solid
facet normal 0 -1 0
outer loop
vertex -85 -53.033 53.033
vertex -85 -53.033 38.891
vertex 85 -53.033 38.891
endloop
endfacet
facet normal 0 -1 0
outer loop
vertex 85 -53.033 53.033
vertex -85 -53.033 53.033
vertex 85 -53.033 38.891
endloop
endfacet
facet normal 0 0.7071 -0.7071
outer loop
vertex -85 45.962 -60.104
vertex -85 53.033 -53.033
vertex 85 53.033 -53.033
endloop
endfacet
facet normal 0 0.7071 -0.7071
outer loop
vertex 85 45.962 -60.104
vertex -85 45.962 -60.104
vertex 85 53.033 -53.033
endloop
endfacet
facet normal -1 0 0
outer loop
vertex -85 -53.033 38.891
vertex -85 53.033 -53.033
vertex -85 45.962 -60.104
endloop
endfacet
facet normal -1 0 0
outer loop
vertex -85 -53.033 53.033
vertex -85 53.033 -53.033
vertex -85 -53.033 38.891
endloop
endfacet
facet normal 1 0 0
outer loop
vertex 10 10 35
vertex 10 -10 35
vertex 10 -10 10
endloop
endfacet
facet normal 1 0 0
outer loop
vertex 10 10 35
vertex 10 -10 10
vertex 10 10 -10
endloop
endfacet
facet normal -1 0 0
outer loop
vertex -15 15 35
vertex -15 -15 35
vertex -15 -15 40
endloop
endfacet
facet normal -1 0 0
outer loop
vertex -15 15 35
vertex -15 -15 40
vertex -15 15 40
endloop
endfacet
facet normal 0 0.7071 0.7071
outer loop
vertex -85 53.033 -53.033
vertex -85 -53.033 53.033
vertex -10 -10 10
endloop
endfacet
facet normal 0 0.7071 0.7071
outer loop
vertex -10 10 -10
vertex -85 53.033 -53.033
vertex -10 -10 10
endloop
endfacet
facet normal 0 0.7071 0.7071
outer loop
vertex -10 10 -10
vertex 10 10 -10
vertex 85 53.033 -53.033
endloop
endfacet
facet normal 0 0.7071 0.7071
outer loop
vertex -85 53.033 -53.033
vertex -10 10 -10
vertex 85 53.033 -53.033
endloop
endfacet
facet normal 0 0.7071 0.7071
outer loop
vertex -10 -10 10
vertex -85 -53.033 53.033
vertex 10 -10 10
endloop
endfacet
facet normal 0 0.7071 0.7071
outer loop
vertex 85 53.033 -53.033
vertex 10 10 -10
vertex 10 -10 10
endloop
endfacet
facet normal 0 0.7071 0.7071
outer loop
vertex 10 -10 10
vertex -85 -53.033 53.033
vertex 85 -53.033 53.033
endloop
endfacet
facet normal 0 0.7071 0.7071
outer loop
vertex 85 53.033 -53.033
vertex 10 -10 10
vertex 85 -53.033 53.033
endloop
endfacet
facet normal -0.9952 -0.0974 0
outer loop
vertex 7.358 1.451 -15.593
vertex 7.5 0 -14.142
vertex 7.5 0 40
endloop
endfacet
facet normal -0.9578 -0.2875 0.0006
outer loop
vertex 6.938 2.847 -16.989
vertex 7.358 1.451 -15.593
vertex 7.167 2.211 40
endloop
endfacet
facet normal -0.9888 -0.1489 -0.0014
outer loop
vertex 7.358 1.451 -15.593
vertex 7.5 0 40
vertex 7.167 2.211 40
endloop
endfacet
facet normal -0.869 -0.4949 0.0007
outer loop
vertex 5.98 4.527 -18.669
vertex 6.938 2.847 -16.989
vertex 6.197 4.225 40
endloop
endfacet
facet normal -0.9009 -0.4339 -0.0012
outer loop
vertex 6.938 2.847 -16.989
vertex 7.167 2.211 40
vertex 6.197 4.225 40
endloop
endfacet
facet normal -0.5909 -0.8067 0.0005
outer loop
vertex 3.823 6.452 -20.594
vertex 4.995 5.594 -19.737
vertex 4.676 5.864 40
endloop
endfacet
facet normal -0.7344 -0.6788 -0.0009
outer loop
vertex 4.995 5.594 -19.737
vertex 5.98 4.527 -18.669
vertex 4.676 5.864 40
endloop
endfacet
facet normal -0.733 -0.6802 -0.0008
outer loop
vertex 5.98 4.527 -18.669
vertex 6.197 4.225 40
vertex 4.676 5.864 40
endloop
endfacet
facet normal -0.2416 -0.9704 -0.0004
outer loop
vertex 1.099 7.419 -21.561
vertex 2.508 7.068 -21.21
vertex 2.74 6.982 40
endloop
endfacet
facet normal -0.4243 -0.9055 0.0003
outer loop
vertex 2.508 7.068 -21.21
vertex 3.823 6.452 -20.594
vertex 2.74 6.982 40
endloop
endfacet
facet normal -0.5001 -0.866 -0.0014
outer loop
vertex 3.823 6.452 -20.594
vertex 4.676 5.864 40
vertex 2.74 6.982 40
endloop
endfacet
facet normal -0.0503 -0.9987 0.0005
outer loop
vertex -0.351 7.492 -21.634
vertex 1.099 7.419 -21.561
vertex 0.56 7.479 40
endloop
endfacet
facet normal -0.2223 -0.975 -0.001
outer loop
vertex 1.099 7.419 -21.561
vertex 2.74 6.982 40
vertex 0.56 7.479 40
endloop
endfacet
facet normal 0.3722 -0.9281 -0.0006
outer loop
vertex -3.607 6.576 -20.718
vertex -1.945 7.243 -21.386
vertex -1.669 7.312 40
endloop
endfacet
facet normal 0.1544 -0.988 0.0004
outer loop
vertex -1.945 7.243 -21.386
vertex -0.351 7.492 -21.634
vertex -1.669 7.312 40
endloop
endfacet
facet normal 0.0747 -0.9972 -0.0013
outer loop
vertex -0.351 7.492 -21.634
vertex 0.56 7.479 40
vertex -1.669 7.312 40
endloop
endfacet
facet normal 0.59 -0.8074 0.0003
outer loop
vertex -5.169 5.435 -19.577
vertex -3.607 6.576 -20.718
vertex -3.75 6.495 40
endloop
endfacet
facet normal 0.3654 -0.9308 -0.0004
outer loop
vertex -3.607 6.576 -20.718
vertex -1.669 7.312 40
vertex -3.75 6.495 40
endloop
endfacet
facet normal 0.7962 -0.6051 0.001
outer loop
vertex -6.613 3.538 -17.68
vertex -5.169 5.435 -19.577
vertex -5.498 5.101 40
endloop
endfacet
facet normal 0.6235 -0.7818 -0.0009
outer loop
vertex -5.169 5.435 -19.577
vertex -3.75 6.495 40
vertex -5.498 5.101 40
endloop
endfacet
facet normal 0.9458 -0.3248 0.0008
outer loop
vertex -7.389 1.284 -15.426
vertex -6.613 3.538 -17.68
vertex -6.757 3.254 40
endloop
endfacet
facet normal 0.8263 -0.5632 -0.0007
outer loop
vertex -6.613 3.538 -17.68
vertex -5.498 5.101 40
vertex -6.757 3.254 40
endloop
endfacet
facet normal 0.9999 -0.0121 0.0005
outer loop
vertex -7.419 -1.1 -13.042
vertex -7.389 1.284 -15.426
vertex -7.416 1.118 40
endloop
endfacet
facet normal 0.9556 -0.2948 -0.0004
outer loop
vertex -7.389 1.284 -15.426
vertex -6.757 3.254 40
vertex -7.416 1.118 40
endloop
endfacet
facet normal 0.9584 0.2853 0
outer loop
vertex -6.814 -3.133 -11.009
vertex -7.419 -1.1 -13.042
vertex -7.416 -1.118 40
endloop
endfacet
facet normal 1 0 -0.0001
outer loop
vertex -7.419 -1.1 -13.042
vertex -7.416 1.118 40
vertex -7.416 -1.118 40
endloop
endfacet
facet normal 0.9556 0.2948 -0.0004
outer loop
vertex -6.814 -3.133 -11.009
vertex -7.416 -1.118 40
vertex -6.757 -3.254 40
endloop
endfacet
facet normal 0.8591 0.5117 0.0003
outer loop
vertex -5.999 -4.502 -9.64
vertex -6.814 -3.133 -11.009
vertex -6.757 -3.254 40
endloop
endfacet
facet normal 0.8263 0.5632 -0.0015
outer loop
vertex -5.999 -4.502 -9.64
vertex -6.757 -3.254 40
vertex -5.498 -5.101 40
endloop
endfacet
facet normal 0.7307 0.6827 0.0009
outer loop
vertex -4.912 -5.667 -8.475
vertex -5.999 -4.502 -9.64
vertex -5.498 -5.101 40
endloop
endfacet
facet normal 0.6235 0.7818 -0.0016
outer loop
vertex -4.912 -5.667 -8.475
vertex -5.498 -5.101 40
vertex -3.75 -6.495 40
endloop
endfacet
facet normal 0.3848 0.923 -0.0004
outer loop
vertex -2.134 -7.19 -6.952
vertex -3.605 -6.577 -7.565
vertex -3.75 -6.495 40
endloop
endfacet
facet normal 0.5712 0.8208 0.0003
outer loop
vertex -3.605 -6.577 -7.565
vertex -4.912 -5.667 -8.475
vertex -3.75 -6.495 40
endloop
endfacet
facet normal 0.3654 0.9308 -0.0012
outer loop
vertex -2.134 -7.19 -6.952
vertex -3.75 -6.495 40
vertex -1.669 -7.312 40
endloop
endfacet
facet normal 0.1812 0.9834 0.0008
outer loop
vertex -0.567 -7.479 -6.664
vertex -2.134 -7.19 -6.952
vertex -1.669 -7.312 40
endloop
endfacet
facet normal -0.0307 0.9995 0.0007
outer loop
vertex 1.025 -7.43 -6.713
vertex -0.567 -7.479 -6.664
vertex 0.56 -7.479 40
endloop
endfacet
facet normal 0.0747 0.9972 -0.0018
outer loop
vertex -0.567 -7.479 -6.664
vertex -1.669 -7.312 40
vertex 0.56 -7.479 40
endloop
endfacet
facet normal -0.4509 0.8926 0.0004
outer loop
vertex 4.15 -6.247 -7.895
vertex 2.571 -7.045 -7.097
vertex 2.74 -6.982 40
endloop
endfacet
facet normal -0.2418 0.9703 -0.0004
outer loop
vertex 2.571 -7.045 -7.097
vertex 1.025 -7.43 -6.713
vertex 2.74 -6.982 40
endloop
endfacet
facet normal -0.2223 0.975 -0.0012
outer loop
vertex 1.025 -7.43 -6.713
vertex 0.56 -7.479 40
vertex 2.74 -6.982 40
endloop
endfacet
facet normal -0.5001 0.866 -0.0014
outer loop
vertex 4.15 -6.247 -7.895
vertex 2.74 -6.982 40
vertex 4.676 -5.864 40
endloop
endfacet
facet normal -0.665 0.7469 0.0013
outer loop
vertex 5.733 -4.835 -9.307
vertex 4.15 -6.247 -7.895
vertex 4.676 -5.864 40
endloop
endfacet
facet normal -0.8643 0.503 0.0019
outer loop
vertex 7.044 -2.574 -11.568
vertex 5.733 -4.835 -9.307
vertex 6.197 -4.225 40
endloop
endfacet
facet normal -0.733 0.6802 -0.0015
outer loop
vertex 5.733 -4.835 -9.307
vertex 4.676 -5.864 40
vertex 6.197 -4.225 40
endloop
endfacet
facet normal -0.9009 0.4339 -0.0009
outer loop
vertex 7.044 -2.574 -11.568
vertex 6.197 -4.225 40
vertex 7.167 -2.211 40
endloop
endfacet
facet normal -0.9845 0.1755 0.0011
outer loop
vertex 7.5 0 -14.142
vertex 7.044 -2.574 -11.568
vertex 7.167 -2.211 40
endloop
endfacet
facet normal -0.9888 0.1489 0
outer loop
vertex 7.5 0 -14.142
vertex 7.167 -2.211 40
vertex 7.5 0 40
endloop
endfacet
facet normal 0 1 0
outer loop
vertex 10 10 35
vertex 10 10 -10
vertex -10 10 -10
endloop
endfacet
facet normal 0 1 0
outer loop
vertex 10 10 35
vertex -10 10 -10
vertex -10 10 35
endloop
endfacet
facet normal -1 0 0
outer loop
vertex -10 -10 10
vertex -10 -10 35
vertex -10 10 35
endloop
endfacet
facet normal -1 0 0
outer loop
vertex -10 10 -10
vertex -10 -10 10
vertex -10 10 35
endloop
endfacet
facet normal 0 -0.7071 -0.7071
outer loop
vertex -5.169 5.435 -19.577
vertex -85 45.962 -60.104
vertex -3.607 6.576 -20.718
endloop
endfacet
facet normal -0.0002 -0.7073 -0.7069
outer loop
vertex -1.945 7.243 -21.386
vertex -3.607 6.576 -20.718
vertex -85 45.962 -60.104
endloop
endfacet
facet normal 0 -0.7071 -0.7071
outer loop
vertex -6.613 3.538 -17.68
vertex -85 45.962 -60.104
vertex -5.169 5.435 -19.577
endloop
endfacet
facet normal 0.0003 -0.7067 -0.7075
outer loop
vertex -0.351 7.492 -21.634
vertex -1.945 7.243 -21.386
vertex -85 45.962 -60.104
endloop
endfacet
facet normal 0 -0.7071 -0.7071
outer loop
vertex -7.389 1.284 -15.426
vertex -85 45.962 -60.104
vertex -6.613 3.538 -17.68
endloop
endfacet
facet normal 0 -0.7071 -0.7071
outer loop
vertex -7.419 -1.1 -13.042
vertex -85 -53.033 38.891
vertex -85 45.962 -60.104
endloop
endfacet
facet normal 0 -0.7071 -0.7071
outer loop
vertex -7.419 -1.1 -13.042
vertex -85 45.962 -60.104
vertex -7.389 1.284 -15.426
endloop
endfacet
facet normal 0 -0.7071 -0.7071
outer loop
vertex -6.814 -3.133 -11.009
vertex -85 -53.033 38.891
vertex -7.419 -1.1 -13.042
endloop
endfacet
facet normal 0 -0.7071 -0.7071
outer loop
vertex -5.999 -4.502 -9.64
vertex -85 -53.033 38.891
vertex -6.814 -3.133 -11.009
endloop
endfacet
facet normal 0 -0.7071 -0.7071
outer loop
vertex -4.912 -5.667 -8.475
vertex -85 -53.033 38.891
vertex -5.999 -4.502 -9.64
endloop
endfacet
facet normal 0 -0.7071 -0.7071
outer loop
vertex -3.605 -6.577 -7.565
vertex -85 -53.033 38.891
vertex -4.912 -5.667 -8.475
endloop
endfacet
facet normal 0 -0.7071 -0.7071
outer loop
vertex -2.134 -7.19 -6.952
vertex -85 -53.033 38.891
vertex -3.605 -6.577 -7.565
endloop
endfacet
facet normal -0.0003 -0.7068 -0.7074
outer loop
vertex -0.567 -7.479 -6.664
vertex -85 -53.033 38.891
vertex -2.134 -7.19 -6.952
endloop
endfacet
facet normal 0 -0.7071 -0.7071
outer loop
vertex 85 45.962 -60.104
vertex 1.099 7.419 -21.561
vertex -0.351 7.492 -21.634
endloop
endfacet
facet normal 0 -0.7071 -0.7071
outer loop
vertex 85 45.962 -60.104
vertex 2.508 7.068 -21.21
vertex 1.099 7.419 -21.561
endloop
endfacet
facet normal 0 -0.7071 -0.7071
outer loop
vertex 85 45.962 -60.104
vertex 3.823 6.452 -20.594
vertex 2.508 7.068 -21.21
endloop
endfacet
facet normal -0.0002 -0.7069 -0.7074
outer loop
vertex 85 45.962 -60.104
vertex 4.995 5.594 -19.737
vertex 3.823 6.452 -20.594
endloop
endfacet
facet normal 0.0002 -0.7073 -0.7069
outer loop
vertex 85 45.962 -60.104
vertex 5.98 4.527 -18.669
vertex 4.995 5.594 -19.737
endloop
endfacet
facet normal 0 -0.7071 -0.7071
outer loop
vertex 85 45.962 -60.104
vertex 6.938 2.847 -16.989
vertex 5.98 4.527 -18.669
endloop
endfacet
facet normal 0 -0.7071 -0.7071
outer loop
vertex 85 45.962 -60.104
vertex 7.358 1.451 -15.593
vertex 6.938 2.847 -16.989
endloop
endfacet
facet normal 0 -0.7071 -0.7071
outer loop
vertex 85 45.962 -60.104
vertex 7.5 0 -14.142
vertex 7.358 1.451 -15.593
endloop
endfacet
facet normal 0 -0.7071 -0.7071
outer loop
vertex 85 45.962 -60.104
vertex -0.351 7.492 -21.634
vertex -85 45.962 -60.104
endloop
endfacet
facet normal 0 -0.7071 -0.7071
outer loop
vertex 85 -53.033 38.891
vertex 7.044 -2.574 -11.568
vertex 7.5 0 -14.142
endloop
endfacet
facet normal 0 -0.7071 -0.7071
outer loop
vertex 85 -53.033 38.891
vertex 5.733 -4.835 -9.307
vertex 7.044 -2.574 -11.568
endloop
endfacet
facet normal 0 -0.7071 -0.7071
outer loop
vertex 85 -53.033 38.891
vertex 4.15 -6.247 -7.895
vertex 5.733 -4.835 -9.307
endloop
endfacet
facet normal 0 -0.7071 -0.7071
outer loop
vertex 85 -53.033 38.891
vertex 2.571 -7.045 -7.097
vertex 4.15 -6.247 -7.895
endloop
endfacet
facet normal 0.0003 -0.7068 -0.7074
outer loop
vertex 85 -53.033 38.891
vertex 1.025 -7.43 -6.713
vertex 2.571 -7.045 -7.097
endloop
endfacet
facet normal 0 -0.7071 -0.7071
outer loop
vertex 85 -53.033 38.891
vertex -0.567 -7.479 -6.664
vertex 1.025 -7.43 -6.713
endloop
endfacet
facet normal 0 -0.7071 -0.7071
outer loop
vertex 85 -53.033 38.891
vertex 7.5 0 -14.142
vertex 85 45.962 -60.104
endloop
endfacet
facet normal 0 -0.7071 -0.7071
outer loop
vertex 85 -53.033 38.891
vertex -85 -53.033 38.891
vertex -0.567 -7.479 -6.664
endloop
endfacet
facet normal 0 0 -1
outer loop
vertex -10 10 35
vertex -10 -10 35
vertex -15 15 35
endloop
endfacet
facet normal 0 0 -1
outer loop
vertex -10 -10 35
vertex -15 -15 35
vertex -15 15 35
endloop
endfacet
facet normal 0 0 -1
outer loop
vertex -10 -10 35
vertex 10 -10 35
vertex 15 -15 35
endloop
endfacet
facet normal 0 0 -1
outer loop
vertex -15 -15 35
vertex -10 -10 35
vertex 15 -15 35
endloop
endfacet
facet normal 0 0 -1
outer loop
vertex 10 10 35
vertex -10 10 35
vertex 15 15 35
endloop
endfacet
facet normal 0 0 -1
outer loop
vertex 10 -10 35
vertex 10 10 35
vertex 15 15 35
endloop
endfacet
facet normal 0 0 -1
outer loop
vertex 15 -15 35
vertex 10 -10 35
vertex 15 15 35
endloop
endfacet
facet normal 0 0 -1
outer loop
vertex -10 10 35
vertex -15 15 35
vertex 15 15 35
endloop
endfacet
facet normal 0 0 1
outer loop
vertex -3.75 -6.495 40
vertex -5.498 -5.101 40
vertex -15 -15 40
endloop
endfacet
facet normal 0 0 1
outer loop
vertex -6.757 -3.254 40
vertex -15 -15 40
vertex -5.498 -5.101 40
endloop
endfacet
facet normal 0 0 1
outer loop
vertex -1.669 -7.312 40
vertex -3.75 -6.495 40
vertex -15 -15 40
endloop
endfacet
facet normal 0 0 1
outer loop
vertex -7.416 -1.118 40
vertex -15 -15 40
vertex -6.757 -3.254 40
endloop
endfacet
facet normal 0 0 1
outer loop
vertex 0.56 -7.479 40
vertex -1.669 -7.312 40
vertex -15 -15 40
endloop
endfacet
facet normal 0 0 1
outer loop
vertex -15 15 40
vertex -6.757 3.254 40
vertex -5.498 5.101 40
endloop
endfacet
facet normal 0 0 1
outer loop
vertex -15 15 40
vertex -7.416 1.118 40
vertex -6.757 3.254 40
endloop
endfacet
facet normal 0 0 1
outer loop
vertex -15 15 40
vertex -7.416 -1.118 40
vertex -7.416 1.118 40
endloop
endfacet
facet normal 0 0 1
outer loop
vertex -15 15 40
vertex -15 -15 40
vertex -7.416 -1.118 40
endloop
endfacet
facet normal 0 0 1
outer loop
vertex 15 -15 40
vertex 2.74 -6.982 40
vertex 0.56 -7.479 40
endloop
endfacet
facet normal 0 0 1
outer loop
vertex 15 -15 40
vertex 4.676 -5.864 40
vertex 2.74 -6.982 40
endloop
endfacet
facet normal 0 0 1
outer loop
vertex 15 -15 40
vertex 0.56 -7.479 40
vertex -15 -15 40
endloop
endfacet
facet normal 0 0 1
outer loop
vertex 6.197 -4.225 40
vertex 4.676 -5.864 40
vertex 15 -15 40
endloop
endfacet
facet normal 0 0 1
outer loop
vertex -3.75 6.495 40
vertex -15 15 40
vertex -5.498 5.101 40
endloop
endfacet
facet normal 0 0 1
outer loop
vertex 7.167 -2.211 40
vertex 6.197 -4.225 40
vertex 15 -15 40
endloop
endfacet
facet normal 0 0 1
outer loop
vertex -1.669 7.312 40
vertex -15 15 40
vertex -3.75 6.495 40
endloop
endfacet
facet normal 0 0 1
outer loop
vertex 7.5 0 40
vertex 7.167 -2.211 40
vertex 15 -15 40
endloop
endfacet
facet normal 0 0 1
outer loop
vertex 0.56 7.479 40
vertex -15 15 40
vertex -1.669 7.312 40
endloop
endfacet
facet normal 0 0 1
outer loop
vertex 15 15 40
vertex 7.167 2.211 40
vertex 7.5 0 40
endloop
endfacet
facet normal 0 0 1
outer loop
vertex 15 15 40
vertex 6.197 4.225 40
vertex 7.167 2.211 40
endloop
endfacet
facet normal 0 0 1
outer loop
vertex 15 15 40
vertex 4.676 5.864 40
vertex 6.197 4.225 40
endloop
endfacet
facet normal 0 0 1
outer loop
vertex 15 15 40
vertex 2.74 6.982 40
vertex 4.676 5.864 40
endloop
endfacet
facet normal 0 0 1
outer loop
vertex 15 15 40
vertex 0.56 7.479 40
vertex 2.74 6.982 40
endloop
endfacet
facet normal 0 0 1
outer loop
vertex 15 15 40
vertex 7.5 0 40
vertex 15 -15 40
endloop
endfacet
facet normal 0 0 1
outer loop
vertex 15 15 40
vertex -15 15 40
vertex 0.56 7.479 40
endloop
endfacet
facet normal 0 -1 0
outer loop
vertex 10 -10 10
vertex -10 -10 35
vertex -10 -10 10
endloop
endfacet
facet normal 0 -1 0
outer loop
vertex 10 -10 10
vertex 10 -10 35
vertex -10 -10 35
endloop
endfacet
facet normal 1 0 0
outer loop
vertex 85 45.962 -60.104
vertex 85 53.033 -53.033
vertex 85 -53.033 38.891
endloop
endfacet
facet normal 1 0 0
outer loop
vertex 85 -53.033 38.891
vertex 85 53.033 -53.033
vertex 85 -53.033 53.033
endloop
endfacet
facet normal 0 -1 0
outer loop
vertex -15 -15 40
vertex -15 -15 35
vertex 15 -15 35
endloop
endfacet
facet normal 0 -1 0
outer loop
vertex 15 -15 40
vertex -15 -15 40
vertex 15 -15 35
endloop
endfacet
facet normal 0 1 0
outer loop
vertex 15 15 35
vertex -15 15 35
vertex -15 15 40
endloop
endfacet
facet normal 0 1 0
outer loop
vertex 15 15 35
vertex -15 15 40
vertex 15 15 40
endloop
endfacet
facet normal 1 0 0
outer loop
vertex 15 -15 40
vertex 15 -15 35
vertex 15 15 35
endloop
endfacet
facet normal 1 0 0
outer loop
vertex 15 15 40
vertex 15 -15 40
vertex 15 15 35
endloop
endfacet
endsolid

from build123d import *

# Parameters (mm, degrees)
F1_W     = 170
F1_H     = 150
F2_DEPTH = 10
F3_SIZE  = 9.99999
F5_DEPTH = 10
F6_W     = 30
F6_H     = 30
F7_DEPTH = 5
F8_R     = 7.5
F9_DEPTH = 100.1050764009


# Not quite as in the source:
# - a fillet or chamfer is up to 0.001 mm smaller than in the source, because OpenCascade refuses the exact size


with BuildPart() as f2:
    # F1 (on face) → F2 (new body)
    with BuildSketch(Plane(origin=(0, 0, 0), x_dir=(1, 0, 0), z_dir=(0, -0.7071067812, -0.7071067812))):
        Rectangle(F1_W, F1_H)
    extrude(amount=F2_DEPTH)

    # F3 (size 10 in the source; OpenCascade refuses exactly that, so slightly less here)
    f3_edges = [f2.edges().sort_by_distance(p)[0] for p in [
        (0, -60.104076, 45.961941),
    ]]
    chamfer(f3_edges, length=F3_SIZE)

    # F4 (on Right) → F5 (join, symmetric)
    with BuildSketch(Plane.YZ):
        Polygon((-10, 35), (-10, 10), (10, -10), (10, 35), align=None)
    extrude(amount=F5_DEPTH, both=True)

    # F6 (on face) → F7 (join)
    with BuildSketch(Plane.XY.offset(35)):
        Rectangle(F6_W, F6_H)
    extrude(amount=F7_DEPTH)

    # F8 (on face) → F9 (cut, through all)
    with BuildSketch(Plane.XY.offset(40)):
        Circle(F8_R)
    extrude(amount=-F9_DEPTH, mode=Mode.SUBTRACT)


solid = f2.part
